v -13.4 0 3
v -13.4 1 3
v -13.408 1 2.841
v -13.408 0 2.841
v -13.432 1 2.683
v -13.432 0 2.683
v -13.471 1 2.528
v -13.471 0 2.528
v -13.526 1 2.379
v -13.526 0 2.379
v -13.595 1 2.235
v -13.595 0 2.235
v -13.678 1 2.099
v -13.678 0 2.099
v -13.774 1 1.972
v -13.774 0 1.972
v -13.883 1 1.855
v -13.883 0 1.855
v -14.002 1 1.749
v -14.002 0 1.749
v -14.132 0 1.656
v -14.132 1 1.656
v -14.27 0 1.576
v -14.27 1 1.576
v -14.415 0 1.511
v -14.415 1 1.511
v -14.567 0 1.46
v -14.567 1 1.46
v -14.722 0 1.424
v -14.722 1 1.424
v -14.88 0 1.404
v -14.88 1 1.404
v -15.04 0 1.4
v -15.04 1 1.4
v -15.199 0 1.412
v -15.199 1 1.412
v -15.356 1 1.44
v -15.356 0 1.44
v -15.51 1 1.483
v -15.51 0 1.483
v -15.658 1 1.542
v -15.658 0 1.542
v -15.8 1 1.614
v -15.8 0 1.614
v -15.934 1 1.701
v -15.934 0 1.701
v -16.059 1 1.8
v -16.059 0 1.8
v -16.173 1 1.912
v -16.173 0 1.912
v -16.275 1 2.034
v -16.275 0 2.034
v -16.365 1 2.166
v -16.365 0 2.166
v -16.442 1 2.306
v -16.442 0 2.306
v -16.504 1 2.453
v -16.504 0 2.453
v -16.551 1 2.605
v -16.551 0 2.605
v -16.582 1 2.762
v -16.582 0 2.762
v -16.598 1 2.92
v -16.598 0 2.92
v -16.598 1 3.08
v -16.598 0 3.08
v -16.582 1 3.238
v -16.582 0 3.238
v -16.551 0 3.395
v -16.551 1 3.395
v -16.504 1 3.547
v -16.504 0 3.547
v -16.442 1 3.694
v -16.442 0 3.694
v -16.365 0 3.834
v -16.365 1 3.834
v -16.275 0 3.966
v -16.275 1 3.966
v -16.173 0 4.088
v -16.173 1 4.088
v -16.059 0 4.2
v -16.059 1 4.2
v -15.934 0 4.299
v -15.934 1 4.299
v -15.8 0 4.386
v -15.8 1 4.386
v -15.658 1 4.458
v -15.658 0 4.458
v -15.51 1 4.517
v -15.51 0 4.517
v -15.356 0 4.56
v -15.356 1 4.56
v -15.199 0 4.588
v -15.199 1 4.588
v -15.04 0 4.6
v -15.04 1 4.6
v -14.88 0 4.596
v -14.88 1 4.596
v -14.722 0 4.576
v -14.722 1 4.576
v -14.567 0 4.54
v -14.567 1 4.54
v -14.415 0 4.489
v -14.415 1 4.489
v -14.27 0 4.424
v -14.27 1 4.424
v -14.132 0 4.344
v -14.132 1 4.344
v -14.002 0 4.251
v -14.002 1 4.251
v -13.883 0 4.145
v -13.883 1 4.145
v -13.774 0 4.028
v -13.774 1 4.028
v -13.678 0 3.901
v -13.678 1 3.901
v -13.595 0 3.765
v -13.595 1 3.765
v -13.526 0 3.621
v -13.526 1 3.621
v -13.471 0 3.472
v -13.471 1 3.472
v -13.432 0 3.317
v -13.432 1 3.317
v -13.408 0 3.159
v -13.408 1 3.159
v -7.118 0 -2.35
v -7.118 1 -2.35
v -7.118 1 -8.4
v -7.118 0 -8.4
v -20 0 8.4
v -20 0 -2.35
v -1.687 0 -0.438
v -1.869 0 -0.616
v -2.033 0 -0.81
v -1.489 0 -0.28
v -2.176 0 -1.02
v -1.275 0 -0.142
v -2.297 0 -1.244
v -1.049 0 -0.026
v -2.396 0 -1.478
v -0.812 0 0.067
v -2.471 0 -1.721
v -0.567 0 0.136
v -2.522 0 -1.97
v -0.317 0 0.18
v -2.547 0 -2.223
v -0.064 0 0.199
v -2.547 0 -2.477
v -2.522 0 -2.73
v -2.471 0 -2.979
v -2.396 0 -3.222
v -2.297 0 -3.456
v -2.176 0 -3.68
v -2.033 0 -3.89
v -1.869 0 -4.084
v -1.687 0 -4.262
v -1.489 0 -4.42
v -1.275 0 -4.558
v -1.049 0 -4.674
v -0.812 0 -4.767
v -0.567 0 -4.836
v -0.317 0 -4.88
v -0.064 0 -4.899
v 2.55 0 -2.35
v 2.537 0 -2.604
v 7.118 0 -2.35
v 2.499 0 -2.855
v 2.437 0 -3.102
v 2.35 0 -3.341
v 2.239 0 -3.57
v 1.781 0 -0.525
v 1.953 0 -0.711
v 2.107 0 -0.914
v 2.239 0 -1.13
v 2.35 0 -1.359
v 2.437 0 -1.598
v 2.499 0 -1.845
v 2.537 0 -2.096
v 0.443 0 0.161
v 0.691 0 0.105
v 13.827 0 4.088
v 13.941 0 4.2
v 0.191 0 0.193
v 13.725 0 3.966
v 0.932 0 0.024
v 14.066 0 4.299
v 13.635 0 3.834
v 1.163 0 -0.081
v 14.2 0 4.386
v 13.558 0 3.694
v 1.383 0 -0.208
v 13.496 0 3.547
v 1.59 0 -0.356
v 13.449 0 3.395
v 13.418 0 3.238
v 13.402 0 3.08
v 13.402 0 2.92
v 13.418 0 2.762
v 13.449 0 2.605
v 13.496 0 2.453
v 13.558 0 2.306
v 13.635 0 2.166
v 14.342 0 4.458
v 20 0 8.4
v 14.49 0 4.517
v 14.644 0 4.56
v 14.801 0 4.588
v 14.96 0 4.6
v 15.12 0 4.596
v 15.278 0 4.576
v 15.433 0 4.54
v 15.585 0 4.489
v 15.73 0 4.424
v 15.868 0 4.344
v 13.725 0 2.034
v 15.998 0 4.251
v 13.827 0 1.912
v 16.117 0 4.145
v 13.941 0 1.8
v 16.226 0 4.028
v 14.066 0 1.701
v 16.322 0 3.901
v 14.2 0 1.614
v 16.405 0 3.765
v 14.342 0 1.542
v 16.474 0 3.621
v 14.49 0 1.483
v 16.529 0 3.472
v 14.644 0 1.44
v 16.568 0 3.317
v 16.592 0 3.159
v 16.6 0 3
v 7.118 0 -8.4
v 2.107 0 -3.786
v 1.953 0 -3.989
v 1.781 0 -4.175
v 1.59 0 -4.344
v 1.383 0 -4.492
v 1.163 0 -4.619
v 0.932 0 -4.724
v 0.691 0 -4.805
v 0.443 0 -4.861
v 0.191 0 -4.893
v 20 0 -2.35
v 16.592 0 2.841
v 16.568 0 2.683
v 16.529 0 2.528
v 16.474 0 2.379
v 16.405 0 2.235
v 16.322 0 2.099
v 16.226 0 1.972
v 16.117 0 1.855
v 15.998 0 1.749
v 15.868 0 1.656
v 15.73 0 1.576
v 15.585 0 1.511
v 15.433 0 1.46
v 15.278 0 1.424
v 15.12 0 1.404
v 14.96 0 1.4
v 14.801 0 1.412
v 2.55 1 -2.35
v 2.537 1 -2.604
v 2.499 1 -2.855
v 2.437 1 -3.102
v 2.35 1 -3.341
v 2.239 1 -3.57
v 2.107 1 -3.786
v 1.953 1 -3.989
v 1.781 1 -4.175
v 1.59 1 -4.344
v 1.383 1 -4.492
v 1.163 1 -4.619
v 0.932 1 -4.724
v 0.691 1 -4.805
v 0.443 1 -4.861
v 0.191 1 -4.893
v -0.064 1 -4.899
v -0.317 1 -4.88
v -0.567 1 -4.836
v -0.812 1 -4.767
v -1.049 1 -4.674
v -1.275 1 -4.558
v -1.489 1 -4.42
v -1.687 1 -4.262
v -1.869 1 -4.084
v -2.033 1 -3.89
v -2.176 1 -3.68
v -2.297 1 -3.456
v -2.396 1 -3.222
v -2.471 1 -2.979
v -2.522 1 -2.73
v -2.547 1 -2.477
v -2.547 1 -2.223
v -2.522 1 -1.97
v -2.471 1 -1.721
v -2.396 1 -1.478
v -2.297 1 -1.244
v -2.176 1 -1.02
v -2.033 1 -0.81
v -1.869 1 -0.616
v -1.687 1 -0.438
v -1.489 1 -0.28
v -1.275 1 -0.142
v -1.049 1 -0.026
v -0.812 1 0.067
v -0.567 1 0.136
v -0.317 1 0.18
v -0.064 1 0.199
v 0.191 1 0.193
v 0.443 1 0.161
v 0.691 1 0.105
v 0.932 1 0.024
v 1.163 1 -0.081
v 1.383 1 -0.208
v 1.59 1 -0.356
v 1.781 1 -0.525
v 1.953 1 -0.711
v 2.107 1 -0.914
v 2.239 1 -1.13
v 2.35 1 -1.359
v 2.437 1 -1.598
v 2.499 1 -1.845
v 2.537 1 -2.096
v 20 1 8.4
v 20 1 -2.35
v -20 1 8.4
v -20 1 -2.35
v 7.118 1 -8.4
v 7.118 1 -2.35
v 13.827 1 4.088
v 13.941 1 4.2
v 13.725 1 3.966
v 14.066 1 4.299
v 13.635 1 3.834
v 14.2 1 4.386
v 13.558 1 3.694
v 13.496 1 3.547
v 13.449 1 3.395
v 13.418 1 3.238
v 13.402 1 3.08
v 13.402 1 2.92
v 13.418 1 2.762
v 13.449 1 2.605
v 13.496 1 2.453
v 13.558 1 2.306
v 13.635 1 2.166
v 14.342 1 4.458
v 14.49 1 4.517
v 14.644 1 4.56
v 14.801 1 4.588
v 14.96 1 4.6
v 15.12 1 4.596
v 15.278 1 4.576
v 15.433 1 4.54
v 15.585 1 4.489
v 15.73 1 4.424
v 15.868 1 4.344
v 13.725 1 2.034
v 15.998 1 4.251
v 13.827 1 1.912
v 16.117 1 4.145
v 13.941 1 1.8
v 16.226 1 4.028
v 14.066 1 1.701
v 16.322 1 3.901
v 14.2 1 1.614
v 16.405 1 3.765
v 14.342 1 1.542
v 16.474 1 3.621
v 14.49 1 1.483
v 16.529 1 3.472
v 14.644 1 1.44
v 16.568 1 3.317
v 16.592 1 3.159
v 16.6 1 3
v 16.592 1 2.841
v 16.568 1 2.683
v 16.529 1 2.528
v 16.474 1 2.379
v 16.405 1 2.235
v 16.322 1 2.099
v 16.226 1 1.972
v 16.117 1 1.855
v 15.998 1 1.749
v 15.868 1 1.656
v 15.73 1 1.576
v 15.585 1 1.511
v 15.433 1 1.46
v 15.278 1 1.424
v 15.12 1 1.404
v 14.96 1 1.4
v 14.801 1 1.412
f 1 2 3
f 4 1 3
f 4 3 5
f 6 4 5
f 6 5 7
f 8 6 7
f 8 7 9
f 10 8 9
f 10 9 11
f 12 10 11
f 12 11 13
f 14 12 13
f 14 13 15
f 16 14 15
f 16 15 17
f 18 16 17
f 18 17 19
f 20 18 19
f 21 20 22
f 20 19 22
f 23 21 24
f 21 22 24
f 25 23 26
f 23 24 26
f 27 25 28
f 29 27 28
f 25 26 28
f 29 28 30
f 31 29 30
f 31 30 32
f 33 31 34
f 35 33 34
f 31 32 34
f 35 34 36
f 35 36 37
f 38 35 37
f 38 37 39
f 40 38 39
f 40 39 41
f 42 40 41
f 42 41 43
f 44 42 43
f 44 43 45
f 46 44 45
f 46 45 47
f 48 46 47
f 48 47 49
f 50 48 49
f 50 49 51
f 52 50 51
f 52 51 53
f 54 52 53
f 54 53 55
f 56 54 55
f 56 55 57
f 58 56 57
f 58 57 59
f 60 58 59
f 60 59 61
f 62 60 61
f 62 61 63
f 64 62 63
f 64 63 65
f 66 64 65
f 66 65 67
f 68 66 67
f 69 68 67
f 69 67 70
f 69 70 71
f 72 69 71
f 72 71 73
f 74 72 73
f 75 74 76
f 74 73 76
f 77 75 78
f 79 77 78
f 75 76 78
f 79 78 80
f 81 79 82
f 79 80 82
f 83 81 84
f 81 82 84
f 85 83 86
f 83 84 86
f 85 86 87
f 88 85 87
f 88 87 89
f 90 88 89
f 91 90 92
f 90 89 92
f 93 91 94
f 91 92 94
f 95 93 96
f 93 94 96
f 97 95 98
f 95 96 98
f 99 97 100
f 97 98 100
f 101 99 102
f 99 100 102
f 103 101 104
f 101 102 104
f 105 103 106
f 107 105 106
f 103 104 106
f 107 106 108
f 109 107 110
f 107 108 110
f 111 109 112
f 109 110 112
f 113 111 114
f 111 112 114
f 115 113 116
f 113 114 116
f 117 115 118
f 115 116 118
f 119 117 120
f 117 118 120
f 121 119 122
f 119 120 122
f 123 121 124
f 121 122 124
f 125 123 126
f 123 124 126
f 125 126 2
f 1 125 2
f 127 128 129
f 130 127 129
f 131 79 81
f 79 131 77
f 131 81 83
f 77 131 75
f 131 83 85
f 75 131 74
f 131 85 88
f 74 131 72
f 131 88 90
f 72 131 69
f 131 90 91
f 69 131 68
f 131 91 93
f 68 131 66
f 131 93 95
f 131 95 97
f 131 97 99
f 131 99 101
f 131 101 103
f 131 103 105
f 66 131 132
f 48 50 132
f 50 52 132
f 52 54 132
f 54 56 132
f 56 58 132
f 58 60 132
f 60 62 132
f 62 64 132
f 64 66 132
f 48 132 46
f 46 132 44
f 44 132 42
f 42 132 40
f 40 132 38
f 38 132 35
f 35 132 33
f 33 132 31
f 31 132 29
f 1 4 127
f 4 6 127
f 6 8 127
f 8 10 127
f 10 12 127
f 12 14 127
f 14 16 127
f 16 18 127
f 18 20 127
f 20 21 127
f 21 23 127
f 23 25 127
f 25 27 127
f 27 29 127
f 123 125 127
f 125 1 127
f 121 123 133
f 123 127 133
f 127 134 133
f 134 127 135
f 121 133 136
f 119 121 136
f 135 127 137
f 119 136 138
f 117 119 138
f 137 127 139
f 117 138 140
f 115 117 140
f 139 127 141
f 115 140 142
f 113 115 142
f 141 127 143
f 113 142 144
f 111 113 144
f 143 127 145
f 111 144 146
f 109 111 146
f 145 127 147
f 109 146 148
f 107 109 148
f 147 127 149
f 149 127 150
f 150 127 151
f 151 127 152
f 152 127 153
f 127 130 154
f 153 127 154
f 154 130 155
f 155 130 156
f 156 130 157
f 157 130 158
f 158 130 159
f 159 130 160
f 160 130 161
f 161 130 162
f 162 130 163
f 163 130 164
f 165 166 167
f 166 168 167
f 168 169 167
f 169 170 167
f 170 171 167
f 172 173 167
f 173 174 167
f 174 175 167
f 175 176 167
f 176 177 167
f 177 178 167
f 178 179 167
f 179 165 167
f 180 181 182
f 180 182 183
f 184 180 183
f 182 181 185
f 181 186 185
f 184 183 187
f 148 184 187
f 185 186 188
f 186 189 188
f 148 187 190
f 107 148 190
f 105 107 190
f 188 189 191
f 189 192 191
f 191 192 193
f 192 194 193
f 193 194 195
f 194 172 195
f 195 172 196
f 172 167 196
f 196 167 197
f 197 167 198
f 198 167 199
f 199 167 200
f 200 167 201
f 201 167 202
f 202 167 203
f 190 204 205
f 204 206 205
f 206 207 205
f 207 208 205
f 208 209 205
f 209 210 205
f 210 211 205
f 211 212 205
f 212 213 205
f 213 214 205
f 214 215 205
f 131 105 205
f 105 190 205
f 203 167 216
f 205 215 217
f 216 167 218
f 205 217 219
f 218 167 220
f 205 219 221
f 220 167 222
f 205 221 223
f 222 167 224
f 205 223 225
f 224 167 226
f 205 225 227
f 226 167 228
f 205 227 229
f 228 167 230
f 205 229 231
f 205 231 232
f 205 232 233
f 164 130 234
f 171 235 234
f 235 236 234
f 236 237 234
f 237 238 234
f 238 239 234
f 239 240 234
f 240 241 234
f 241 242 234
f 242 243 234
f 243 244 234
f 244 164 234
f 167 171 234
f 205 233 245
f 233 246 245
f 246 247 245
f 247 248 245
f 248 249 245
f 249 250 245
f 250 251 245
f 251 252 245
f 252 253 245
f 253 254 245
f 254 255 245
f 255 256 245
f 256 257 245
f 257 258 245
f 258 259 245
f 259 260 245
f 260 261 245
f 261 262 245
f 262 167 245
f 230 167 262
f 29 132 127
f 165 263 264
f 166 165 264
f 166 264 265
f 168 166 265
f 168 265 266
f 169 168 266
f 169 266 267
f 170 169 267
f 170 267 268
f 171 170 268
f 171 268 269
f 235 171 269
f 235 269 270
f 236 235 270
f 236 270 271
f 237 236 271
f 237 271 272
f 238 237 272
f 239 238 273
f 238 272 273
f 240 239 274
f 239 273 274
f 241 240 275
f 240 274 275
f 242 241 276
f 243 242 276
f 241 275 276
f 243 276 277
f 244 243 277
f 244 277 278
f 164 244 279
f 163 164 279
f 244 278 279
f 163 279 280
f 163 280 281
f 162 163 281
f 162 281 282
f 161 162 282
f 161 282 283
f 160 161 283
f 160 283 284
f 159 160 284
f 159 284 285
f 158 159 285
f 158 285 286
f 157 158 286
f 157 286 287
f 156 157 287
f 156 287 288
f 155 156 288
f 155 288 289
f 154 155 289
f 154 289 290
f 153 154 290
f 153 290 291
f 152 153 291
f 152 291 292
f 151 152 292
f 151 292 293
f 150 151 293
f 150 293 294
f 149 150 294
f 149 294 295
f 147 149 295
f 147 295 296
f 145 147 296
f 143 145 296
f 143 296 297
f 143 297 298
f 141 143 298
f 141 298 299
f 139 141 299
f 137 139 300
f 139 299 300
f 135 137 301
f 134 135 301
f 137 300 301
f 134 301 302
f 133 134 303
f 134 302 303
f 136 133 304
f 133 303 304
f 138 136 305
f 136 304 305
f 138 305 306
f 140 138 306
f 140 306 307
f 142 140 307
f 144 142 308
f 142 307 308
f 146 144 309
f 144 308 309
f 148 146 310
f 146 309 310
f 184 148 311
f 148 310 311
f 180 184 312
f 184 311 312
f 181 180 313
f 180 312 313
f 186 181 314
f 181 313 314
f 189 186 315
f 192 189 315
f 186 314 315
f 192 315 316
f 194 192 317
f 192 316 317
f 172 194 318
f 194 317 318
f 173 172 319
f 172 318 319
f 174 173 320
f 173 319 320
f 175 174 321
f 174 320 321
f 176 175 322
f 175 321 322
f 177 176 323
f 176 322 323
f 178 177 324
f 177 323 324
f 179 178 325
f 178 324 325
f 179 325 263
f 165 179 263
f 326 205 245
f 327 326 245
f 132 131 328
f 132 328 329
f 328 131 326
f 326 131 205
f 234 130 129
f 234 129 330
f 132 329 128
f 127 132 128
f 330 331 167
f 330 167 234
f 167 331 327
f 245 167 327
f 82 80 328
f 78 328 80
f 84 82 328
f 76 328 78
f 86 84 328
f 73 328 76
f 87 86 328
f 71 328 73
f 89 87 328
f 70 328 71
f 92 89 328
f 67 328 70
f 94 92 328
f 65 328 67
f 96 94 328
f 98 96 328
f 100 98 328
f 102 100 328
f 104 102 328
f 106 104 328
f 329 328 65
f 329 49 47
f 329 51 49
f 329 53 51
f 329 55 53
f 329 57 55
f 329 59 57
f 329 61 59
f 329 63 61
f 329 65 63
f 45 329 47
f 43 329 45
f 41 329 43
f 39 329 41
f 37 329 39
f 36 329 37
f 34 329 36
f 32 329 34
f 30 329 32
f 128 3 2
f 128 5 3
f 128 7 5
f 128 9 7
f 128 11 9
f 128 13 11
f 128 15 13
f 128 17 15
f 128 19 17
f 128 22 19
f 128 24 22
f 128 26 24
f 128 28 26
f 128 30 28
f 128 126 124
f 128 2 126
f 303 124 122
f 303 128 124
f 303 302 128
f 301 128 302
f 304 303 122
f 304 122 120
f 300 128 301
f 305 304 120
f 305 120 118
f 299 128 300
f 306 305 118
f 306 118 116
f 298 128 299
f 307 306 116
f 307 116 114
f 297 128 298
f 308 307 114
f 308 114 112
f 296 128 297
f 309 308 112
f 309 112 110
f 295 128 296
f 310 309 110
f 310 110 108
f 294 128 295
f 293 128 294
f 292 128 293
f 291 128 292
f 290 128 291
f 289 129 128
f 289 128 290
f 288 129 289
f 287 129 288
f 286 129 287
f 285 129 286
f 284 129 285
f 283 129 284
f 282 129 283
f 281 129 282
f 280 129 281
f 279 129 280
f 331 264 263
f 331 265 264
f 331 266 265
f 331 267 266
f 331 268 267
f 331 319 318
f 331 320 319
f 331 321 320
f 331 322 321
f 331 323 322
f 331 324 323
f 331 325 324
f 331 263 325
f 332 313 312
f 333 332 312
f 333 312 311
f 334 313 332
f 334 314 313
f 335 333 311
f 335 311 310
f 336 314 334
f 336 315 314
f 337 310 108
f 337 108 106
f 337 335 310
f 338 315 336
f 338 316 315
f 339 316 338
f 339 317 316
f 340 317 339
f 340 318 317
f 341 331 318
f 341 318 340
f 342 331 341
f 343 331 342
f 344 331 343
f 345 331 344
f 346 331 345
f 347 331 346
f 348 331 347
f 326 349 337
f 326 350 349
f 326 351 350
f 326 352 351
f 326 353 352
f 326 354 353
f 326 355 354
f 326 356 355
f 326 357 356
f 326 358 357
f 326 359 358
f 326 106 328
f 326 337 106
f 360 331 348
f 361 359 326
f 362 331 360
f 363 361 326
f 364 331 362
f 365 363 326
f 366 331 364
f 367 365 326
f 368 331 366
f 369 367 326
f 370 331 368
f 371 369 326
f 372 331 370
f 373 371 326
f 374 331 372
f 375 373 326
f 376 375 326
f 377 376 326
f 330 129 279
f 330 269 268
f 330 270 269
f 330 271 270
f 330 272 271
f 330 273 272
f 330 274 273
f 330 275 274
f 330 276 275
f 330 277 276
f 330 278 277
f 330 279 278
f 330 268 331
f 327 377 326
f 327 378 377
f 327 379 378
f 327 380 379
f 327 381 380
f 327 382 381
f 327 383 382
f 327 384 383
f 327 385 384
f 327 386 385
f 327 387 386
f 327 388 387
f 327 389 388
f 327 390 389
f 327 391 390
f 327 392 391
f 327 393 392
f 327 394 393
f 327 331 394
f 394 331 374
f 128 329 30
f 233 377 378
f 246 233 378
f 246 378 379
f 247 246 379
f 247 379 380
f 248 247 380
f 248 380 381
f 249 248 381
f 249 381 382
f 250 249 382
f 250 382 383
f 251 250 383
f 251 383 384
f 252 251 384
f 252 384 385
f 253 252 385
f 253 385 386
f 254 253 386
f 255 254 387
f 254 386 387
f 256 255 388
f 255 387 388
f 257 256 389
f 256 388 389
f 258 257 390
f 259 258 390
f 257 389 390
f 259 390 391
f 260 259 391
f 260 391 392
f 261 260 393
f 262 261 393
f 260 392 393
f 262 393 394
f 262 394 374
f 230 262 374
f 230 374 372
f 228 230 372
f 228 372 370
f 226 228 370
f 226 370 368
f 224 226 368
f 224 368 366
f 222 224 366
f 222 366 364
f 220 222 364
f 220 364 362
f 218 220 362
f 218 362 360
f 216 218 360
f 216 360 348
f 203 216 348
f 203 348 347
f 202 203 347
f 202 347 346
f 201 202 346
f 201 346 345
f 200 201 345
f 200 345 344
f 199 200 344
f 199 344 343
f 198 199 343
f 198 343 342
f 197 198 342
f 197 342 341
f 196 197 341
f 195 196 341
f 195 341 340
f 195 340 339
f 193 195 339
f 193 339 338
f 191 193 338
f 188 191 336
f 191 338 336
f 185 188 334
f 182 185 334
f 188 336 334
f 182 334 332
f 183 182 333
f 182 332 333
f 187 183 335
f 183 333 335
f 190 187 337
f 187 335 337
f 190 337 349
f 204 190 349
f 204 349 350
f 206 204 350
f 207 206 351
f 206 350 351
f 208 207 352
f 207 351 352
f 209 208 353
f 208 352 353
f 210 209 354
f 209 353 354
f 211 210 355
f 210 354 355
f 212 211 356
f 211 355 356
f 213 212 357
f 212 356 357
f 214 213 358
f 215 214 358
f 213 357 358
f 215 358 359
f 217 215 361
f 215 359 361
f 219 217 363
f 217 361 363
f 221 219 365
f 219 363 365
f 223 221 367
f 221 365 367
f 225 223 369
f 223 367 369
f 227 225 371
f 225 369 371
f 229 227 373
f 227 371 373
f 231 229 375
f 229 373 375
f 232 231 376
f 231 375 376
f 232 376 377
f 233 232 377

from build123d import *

# Parameters (mm, degrees)
SKETCH_1_W          = 40
SKETCH_1_H          = 16.8
EXTRUDE_1_DEPTH     = 1
SKETCH_3_R          = 1.6
SKETCH_3_R_2        = 2.55
SKETCH_3_W          = 12.882492612
SKETCH_3_H          = 6.05
CUT_EXTRUDE_1_DEPTH = 2


with BuildPart() as part:
    # Эскиз1 → Бобышка-Вытянуть1 (new body)
    with BuildSketch(Plane(origin=(0, 0, 0), x_dir=(1, 0, 0), z_dir=(0, 1, 0))):
        Rectangle(SKETCH_1_W, SKETCH_1_H)
    extrude(amount=EXTRUDE_1_DEPTH)

    # Эскиз3 → Вырез-Вытянуть1 (cut, through all)
    with BuildSketch(Plane(origin=(0, 1, 0), x_dir=(1, 0, 0), z_dir=(0, 1, 0))):
        with Locations((-15, -3)):
            Circle(SKETCH_3_R)
        with Locations((15, -3)):
            Circle(SKETCH_3_R)
        with Locations((0, 2.35)):
            Circle(SKETCH_3_R_2)
        with Locations((13.558753694, 5.375)):
            Rectangle(SKETCH_3_W, SKETCH_3_H)
        with Locations((-13.558753694, 5.375)):
            Rectangle(SKETCH_3_W, SKETCH_3_H)
    extrude(amount=-CUT_EXTRUDE_1_DEPTH, mode=Mode.SUBTRACT)


solid = part.part
